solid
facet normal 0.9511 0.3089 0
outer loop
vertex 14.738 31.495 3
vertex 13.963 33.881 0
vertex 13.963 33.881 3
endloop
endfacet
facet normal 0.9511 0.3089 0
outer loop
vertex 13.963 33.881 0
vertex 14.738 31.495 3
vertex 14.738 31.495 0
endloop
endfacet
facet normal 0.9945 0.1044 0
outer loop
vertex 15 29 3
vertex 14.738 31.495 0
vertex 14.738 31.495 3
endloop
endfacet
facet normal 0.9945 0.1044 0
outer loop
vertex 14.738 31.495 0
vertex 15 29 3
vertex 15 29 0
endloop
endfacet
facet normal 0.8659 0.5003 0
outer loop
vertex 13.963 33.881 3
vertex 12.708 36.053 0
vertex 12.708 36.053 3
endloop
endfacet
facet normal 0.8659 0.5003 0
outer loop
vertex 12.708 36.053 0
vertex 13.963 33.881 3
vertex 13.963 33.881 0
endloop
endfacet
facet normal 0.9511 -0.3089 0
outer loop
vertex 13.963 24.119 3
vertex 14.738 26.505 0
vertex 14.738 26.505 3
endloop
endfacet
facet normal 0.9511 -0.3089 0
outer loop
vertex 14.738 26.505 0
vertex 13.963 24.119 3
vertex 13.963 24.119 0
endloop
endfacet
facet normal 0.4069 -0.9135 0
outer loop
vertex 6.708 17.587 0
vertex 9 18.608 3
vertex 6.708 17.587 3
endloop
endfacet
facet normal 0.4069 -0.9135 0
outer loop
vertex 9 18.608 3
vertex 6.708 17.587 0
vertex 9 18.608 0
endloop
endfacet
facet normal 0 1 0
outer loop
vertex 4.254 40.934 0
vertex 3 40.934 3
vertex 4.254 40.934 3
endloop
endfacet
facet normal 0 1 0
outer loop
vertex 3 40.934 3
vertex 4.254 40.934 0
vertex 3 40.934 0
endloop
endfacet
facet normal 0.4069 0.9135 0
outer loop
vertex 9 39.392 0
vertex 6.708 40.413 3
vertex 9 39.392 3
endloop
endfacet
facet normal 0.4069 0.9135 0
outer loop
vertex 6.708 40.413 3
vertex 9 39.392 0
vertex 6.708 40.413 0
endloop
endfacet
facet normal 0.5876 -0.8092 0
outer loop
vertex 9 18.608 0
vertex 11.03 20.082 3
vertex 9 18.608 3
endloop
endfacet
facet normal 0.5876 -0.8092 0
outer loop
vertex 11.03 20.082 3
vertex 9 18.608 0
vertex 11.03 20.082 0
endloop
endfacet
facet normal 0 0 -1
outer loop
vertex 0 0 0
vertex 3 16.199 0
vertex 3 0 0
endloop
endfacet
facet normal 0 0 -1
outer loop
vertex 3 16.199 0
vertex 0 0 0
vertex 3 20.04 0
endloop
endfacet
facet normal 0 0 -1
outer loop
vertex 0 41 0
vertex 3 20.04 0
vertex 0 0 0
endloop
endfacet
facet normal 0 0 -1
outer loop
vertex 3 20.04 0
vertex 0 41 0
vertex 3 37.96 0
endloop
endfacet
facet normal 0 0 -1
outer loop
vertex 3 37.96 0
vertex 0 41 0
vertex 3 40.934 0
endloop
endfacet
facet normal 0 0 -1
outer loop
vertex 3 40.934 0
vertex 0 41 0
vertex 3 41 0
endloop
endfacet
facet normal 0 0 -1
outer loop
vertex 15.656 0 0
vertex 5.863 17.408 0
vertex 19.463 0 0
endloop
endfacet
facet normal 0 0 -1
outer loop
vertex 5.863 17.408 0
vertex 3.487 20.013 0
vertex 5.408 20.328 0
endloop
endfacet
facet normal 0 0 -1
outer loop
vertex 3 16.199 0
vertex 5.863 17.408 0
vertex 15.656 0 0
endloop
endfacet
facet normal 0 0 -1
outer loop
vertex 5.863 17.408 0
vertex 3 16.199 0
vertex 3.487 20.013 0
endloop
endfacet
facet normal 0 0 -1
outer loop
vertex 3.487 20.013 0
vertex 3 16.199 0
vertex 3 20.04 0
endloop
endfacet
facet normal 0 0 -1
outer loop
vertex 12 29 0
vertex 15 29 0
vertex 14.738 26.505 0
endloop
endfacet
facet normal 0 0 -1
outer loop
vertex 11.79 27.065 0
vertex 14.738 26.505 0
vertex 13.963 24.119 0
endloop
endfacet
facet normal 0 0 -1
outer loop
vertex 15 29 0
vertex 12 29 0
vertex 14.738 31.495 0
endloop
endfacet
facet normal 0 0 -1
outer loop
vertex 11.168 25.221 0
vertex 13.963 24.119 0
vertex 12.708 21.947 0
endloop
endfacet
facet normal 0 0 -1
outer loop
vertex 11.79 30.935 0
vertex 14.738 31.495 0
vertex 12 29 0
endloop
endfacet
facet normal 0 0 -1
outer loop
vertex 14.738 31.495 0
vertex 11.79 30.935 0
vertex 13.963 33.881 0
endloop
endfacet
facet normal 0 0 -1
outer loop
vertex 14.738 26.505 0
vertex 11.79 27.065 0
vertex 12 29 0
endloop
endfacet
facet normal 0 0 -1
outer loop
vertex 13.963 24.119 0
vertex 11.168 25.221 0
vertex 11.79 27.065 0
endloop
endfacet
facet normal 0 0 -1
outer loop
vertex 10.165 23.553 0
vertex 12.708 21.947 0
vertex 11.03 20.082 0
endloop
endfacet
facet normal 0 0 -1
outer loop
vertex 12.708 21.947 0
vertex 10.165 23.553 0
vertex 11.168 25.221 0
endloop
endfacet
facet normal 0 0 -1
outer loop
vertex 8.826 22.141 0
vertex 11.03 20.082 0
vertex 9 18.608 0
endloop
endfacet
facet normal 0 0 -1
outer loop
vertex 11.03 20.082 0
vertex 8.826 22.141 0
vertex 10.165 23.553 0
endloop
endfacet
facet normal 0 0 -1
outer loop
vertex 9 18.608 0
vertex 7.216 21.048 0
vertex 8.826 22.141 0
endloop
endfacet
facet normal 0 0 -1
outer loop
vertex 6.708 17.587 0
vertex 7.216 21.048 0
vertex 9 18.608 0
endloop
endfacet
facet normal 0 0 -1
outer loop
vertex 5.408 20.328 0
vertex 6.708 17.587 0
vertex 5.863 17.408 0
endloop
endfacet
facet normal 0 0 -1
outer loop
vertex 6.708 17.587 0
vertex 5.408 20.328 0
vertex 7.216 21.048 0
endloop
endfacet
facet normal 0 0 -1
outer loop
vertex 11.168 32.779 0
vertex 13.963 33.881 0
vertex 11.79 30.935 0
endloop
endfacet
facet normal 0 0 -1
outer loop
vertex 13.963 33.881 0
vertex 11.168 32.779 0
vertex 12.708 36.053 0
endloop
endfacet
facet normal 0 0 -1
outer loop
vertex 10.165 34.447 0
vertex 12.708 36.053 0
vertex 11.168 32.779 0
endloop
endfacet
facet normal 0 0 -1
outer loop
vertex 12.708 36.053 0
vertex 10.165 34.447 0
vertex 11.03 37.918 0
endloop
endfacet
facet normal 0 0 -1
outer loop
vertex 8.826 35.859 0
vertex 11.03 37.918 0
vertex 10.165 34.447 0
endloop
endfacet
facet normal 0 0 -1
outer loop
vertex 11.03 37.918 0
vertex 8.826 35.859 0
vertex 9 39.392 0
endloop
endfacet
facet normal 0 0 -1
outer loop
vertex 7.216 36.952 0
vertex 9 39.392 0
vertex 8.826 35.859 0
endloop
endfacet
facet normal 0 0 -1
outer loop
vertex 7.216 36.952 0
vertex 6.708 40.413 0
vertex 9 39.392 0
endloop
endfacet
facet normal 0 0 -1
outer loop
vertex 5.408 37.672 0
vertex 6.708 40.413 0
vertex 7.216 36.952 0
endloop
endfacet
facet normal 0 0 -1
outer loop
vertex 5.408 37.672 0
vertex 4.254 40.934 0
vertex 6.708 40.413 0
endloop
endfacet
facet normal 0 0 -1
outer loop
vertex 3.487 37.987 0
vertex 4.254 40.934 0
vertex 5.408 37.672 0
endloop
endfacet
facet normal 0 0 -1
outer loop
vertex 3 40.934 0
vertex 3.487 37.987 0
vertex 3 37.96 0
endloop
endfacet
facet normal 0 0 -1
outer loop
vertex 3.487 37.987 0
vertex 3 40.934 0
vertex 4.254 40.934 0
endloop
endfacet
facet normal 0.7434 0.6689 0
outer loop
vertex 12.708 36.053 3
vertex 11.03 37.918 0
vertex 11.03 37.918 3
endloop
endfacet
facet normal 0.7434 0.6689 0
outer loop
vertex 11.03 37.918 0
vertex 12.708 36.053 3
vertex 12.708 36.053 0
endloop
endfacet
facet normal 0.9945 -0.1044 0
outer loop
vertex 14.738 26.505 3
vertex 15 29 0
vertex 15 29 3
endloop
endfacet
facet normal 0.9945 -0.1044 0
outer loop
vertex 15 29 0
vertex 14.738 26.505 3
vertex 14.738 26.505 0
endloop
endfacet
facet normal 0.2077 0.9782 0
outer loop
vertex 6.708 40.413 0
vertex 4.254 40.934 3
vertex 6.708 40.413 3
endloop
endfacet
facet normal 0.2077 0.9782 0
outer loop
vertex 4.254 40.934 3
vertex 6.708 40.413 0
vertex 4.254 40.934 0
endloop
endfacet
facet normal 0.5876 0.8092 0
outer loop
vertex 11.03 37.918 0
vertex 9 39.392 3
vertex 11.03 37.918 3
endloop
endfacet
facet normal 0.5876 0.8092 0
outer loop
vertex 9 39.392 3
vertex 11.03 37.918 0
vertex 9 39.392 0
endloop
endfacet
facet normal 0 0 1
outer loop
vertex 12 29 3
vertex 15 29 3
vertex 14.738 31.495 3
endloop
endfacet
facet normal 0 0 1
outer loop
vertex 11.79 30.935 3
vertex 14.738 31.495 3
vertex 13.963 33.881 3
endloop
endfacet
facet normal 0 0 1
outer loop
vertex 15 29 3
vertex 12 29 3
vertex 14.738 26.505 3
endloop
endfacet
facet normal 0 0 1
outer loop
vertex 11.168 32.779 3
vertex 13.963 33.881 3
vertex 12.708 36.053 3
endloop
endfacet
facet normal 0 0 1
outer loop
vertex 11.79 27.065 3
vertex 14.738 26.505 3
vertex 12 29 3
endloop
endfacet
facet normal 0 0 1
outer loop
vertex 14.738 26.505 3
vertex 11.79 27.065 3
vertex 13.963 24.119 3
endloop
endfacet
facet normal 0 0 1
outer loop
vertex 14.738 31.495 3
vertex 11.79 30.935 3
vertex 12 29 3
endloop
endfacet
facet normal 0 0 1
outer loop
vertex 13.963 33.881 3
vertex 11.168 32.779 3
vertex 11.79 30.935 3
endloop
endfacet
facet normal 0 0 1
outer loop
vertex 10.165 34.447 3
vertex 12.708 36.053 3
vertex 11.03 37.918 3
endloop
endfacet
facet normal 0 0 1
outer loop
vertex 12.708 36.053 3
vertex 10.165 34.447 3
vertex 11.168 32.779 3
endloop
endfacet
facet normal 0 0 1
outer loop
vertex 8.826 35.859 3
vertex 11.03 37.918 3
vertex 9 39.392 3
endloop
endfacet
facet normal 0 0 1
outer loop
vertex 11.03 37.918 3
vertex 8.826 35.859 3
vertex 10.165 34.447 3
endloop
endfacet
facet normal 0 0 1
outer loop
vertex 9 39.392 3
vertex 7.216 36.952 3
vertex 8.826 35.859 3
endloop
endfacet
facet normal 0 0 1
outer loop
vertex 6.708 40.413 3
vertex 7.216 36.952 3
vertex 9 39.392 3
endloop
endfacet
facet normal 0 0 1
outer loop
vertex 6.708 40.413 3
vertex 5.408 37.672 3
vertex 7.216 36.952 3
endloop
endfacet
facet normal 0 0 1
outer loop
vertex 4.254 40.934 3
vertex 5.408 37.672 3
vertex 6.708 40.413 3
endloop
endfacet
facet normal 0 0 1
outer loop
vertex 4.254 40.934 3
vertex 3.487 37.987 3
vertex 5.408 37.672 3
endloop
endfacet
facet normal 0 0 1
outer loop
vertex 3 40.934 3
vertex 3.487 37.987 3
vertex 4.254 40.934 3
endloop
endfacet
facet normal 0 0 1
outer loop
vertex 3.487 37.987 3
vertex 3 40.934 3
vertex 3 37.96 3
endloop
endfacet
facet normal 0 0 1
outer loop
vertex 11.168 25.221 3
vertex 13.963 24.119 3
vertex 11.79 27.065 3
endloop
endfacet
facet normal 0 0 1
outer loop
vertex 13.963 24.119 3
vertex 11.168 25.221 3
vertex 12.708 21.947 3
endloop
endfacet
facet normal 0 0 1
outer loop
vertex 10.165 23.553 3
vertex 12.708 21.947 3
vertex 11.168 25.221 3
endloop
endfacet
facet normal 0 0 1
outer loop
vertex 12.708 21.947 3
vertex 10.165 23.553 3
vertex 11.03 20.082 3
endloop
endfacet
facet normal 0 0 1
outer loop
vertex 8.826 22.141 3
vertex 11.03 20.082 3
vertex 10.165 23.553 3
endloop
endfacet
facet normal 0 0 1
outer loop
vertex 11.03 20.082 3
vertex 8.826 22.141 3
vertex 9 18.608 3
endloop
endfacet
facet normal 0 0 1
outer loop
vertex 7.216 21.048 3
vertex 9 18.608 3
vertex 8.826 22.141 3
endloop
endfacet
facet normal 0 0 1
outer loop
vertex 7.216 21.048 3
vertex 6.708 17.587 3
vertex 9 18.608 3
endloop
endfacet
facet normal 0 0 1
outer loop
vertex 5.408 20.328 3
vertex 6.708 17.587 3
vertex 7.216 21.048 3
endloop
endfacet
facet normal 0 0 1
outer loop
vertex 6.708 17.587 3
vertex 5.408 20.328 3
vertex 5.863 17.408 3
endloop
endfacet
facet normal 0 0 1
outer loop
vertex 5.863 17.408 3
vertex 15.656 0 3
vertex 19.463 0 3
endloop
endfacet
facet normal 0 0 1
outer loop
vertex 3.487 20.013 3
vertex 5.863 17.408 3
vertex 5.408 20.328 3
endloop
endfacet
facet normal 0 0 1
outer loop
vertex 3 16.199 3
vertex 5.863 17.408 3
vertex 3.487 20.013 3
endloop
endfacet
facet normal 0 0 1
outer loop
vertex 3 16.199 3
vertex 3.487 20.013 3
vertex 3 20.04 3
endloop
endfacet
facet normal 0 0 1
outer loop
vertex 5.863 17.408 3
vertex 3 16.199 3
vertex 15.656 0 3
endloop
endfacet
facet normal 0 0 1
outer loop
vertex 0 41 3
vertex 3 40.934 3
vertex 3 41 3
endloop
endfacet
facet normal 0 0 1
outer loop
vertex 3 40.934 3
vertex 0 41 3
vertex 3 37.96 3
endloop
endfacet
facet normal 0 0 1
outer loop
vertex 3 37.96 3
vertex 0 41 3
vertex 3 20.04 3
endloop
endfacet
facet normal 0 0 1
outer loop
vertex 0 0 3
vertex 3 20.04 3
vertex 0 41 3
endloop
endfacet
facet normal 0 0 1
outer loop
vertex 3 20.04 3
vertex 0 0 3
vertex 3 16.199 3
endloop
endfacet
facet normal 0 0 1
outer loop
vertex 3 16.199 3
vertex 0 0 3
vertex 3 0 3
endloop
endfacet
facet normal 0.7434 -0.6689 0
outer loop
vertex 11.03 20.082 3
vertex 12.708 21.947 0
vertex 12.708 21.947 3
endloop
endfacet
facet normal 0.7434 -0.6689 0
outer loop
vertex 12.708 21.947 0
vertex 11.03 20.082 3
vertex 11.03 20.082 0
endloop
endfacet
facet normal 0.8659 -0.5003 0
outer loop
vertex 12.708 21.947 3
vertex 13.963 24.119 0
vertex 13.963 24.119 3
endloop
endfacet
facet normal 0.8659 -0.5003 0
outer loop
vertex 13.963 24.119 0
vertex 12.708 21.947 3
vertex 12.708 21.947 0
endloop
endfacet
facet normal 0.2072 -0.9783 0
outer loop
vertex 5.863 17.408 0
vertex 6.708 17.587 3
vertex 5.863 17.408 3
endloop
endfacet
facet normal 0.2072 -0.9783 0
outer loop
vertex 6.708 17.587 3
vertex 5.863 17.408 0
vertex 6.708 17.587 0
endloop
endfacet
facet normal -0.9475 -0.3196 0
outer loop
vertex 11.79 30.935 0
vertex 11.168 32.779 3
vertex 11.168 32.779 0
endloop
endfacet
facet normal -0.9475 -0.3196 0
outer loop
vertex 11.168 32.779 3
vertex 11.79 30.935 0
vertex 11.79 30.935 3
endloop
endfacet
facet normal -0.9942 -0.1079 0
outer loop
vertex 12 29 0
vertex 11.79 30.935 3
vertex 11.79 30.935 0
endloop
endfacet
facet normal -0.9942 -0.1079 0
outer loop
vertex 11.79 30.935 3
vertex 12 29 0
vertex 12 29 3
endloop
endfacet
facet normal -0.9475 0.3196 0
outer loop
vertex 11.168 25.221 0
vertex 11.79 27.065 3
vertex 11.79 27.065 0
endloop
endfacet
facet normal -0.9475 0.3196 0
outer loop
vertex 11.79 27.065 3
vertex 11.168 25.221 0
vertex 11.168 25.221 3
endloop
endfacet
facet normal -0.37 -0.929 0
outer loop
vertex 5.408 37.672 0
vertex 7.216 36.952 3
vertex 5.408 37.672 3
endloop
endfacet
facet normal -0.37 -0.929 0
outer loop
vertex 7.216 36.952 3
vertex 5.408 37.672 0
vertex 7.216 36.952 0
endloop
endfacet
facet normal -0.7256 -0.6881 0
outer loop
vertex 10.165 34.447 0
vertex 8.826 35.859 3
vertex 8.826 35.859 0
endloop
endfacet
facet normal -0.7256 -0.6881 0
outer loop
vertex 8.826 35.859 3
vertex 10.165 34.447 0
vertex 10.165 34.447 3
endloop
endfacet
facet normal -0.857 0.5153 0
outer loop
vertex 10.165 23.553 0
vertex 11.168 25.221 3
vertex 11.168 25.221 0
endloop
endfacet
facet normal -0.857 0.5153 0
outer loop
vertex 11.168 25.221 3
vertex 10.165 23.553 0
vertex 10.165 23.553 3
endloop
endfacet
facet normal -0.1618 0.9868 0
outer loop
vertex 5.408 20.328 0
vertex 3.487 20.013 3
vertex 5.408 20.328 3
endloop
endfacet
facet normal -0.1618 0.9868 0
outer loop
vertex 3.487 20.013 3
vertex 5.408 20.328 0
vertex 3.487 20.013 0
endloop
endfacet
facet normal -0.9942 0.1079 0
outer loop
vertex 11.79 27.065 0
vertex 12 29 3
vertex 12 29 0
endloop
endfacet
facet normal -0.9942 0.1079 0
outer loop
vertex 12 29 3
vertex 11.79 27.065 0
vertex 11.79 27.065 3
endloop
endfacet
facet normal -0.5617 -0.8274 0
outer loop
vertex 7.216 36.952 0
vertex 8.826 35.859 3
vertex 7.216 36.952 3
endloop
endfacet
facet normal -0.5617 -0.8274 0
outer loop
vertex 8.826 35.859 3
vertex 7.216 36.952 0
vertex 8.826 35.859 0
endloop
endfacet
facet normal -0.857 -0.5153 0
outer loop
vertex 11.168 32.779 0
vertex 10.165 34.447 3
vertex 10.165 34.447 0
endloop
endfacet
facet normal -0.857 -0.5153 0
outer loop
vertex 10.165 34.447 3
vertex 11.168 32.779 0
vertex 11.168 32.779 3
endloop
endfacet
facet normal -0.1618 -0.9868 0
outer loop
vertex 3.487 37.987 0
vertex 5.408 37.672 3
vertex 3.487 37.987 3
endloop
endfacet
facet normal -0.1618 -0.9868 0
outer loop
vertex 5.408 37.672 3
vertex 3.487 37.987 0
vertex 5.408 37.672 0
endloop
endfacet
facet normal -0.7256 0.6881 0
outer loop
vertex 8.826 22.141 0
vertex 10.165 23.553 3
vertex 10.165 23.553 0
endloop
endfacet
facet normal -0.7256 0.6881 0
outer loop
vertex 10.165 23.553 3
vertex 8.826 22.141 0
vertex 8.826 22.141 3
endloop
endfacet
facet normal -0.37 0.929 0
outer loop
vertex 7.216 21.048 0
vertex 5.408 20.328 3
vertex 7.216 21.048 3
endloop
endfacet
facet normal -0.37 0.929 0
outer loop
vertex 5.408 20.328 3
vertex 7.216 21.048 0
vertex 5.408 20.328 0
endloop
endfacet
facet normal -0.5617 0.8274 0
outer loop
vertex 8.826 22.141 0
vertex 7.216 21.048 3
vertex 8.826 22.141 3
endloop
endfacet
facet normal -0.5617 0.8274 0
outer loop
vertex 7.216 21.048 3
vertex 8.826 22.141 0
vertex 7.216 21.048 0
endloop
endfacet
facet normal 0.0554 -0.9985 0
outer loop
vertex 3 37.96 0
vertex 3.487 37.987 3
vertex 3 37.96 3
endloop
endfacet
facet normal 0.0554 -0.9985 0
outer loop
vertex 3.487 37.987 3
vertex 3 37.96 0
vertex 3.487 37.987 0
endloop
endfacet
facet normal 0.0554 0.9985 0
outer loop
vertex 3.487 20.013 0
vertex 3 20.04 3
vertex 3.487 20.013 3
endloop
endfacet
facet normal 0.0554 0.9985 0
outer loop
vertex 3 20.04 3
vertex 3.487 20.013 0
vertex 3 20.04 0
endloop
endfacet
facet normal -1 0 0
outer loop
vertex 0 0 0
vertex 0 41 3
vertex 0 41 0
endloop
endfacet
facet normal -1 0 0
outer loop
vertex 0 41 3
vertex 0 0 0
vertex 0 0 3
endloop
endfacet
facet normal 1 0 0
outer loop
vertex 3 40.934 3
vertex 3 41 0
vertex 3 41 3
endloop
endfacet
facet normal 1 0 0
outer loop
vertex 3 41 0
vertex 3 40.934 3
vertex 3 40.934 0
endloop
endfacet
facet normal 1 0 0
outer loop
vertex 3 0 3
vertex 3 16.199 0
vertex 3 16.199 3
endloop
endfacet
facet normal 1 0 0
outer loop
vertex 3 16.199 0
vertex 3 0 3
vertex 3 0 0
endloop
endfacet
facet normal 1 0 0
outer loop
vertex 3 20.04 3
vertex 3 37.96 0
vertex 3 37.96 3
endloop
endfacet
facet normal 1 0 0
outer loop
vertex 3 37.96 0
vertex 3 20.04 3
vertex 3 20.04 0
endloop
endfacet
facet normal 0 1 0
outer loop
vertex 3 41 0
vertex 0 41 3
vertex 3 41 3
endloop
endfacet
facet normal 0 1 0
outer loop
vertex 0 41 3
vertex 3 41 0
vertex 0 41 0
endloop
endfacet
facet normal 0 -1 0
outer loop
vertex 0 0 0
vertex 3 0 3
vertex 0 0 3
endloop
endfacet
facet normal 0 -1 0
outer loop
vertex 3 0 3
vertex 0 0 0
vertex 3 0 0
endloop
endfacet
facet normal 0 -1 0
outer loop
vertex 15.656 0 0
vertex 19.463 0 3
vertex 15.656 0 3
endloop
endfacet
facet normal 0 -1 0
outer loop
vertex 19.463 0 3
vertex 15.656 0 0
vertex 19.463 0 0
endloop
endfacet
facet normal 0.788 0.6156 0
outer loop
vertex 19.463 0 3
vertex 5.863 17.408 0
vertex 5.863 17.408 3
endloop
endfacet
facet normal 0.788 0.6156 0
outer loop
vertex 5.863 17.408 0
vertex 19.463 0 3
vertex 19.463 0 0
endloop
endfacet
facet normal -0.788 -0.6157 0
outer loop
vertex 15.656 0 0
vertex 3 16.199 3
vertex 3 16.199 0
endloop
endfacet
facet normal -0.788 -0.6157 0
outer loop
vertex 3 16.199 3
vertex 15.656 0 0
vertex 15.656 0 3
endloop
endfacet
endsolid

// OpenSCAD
//R
union(){
difference(){
  union(){
  cube([3,41,3]);
difference(){
  translate([3,29,0]) cylinder(3,12,12);
  translate([3,29,-1]) cylinder(5,9,9);
  translate([-15,5,-1]) cube([15,40,5]);
}
translate([18,-3,0]) rotate([0,0,38]) cube([3,26,3]);
}
  translate([0,-13,-1]) cube([40,13,5]);

}
}
